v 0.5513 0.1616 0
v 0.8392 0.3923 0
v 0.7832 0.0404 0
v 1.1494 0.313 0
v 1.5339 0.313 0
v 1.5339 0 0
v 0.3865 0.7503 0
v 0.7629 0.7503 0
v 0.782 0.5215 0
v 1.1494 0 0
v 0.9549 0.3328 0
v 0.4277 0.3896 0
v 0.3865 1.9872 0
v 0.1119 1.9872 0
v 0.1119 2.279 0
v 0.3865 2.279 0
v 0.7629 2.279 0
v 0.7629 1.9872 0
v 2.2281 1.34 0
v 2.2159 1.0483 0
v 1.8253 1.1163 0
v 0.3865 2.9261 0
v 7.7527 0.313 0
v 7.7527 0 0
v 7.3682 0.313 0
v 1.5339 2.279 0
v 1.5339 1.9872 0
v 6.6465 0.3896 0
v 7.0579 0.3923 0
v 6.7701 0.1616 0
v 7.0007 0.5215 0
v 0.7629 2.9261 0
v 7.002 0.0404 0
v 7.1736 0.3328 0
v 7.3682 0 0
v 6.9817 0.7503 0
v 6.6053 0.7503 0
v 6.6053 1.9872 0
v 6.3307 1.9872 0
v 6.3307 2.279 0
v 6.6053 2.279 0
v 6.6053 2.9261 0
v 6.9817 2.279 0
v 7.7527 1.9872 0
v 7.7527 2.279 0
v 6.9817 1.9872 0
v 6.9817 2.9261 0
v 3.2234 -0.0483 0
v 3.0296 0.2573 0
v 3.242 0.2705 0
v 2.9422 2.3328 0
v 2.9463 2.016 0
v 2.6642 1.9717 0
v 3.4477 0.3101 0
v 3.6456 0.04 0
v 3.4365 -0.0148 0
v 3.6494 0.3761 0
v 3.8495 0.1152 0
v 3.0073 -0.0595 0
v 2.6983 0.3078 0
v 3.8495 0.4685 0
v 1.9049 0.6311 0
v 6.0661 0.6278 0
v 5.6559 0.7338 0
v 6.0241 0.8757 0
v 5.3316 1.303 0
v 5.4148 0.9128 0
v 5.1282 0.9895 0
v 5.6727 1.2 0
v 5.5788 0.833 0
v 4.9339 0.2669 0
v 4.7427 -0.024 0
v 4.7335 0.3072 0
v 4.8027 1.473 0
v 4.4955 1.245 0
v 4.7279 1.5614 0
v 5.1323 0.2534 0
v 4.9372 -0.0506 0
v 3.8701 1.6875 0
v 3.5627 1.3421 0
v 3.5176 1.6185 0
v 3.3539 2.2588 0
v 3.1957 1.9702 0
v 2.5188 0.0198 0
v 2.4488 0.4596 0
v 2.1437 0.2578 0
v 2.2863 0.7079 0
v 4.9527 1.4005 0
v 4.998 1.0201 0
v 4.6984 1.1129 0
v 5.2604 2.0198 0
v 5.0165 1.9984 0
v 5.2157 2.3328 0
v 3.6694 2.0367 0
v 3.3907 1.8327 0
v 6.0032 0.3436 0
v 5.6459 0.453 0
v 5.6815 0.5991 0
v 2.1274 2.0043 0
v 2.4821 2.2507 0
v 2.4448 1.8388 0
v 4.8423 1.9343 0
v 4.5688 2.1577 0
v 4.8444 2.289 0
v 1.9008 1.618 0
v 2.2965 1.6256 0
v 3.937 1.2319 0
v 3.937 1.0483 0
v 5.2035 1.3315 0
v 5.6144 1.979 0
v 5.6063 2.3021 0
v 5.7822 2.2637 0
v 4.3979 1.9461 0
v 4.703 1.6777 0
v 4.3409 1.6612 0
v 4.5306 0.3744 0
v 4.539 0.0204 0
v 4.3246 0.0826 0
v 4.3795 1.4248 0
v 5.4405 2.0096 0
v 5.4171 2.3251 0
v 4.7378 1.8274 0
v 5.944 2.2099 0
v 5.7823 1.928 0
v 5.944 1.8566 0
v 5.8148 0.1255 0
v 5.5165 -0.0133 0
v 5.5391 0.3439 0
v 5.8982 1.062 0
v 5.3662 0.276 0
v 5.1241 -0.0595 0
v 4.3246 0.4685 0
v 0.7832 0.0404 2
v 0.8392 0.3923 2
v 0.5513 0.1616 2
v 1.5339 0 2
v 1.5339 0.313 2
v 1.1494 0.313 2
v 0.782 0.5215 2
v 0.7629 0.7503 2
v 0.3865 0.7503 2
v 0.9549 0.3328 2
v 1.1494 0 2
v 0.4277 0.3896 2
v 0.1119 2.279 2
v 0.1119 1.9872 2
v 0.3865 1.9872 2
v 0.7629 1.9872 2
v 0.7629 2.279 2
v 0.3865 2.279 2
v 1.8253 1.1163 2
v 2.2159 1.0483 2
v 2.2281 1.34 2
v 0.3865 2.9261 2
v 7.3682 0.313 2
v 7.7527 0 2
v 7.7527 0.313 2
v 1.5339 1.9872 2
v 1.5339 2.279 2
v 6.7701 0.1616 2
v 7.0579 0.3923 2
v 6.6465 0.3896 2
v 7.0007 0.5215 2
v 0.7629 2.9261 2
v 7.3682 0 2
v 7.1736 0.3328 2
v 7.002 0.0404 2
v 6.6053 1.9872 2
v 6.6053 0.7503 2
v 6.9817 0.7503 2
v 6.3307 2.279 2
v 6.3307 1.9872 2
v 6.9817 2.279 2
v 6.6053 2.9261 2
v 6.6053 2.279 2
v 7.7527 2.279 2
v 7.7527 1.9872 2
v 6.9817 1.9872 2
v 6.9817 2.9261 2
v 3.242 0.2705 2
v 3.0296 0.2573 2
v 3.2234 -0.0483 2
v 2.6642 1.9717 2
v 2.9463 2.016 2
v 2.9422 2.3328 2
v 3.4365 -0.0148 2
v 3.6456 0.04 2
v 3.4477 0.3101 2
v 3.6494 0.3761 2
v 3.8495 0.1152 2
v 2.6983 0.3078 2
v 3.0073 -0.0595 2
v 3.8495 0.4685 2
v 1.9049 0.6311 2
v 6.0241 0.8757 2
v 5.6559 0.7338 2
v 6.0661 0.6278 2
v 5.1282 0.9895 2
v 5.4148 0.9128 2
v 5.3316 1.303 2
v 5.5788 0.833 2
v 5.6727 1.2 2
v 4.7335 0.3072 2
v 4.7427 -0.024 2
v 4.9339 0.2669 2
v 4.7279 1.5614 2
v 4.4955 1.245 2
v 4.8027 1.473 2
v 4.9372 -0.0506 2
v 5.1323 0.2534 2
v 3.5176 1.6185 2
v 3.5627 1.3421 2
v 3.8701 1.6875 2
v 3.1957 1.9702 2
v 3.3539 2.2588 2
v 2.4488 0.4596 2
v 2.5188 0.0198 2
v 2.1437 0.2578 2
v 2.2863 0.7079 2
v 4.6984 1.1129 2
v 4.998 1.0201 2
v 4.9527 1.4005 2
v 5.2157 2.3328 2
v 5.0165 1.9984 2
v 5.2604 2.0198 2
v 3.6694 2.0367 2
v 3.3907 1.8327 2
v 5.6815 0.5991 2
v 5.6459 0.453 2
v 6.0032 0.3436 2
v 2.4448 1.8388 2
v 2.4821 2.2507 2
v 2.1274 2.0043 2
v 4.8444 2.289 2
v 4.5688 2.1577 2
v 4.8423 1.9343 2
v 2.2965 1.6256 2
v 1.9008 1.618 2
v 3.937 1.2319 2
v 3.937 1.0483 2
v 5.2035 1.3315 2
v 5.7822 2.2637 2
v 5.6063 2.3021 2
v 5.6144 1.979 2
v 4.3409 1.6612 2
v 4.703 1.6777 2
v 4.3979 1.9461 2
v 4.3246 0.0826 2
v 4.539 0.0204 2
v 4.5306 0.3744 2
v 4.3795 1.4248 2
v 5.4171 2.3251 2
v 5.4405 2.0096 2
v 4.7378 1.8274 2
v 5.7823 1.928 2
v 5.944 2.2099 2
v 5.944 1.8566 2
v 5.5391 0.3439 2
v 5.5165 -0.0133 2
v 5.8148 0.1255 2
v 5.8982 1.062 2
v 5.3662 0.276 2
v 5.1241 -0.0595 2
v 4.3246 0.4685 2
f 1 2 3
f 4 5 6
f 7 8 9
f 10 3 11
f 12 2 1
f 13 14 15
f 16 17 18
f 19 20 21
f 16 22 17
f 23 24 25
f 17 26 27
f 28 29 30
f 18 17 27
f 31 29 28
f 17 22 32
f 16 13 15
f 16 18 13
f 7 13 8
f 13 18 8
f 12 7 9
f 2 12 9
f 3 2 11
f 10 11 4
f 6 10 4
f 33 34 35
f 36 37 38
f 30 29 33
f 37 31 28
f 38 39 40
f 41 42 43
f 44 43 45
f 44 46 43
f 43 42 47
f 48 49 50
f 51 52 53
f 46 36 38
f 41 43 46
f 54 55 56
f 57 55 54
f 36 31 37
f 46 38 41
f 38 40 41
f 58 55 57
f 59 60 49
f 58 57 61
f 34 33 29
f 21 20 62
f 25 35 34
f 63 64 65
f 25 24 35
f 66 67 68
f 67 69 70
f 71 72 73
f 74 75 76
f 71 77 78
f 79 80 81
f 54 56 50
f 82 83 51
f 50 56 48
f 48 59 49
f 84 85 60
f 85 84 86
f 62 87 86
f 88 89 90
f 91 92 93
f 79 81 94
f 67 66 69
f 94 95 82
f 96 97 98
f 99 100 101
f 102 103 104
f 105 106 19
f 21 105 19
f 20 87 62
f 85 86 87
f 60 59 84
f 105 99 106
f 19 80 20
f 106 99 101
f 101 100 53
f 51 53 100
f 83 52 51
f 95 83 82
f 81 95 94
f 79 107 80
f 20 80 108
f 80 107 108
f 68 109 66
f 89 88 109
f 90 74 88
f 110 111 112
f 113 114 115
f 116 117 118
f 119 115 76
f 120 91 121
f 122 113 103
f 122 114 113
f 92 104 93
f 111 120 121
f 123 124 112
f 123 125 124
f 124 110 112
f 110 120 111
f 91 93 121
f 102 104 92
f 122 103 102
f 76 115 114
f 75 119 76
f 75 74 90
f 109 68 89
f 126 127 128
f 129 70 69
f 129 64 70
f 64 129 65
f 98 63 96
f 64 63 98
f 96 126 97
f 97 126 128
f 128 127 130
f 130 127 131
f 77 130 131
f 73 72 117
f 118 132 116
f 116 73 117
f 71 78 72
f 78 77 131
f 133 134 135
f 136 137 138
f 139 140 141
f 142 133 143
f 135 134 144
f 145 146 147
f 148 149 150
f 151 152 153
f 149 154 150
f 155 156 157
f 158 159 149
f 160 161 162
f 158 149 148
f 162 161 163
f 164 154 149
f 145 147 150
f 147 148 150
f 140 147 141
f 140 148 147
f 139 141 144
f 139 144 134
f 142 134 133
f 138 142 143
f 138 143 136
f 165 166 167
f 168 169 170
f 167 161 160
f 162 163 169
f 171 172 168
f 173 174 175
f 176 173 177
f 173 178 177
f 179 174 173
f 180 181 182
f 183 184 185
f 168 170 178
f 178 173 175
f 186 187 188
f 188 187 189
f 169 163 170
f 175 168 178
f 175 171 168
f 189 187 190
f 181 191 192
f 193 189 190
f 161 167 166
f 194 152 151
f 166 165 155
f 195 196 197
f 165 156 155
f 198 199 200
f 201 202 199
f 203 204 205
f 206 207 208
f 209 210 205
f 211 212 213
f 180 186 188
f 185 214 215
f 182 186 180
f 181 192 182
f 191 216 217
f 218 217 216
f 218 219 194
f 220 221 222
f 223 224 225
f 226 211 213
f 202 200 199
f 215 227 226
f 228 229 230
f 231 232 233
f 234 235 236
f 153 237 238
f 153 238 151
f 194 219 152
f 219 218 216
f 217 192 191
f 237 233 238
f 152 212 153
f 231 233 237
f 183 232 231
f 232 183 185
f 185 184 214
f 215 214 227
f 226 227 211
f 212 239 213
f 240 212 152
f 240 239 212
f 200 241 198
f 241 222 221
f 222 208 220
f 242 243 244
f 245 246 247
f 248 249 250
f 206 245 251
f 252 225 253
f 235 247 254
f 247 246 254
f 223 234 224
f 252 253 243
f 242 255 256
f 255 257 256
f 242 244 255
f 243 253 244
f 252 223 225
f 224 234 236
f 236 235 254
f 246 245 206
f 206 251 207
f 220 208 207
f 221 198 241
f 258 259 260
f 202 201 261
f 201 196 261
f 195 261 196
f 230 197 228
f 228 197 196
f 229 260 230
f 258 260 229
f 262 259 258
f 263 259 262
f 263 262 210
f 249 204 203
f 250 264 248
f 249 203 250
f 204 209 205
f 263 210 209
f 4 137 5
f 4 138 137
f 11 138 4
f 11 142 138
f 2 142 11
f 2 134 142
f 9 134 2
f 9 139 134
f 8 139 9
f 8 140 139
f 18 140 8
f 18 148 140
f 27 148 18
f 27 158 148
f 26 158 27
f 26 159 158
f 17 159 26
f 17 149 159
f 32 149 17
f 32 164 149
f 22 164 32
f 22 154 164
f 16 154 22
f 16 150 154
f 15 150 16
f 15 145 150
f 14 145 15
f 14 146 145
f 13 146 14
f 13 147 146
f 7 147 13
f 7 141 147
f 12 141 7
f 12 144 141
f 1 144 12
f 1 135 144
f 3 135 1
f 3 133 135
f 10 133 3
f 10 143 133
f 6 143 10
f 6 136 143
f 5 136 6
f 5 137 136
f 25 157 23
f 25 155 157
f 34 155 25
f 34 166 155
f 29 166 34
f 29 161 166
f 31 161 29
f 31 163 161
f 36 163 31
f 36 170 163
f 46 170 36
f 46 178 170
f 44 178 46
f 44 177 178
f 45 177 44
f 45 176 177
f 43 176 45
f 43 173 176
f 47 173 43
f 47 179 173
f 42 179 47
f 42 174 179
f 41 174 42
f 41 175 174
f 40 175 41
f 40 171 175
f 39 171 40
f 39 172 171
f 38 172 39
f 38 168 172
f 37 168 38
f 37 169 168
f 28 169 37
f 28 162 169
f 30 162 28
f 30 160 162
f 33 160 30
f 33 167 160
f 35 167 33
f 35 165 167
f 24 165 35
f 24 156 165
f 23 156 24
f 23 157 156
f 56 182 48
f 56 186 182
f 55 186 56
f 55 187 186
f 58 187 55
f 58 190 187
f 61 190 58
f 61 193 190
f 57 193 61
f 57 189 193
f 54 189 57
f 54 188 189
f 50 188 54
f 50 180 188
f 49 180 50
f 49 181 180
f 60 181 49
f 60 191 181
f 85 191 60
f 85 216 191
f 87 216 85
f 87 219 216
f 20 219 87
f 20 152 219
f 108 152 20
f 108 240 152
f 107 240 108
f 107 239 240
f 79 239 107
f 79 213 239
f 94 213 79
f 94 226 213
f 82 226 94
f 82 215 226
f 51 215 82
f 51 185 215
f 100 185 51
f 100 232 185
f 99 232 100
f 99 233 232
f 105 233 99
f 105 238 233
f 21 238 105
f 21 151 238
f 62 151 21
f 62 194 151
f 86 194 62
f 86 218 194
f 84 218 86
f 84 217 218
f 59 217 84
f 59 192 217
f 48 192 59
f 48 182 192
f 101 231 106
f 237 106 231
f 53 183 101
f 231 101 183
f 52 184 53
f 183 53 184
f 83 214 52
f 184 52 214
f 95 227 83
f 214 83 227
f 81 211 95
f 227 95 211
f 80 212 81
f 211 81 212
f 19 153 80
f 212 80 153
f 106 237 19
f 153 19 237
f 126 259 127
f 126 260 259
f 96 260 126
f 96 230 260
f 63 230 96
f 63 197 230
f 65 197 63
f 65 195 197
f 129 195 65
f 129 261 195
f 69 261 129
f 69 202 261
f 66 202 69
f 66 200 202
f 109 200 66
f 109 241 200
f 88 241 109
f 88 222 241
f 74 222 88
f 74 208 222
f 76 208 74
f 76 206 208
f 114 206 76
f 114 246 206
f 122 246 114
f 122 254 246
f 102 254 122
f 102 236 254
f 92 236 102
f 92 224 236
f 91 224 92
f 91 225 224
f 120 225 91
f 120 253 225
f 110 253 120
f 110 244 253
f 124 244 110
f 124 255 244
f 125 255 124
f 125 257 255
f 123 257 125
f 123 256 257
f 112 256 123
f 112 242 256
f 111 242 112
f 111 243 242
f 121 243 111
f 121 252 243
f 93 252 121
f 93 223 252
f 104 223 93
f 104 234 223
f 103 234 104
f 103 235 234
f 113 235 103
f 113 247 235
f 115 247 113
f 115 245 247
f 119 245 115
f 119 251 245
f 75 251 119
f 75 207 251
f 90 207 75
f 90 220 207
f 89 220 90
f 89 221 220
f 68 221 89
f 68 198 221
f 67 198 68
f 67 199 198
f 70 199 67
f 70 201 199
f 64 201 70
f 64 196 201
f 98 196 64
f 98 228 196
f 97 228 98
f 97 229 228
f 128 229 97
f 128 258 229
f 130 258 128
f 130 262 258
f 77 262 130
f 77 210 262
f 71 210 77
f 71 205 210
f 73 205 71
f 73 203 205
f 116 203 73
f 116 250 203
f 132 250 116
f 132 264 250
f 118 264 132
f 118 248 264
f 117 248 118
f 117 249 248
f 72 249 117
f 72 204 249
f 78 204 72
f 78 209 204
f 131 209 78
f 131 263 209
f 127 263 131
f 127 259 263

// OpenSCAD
texte_a_inserer = "test"; 
taille = 3; 
police = "LemonOne"; //[[Abril Fatface,Aclonica,Acme,Advent Pro,Akronim,Aladin,Alegreya,Alegreya Sans,Alegreya SC,Alex Brush,Alfa Slab One,Alice,Amaranth,Architects Daughter,Archivo Black,Archivo Narrow,Arimo,Arvo,Asap,Astloch,Asul,Averia Libre,Averia Serif Libre,Bangers,Basic,Belgrano,Berkshire Swash,Bigshot One,Bilbo Swash Caps,Black Ops One,Bonbon,Bowlby One SC,Brawler,Bubblegum Sans,Butterfly Kids,Cabin Condensed,Caesar Dressing,Cagliostro,Calligraffitti,Capriola,Carter One,Changa One,Chango,Chelsea Market,Cherry Cream Soda,Chewy,Chicle,Chivo,Clicker Script,Coming Soon,Concert One,Condiment,Cookie,Courgette,Covered By Your Grace,Crimson Text,Dancing Script,DejaVu Sans,DejaVu Serif,Dhurjati,Doppio One,Dosis,Droid Sans,Eagle Lake,Electrolize,Emilys Candy,Encode Sans,Encode Sans Compressed,Euphoria Script,Exo,Exo 2,Faster One,Federo,Finger Paint,Fjord One,Fontdiner Swanky,Freckle Face,Fruktur,Gabriela,Geo,Germania One,Give You Glory,Gloria Hallelujah,Goudy Bookletter 1911,Graduate,Grand Hotel,Great Vibes,Griffy,Hanalei Fill,Happy Monkey,Henny Penny,Hind,IM Fell English SC,Indie Flower,Irish Grover,Italianno,Jacques Francois Shadow,Jolly Lodger,Josefin Slab,Joti One,Judson,Just Another Hand,Kalam,Kameron,Karma,Kavoon,Knewave,Kranky,Kristi,Laila,Lakki Reddy,Lancelot,Lato,Leckerli One,Ledger,Lekton,Lemon One,Liberation Sans,Libre Caslon Text,Life Savers,Lilita One,Lily Script One,Limelight,Lobster,Lobster Two,Londrina Outline,Londrina Shadow,Londrina Solid,Lora,Love Ya Like A Sister,Loved by the King,Lovers Quarrel,Luckiest Guy,Lusitana,Macondo,Macondo Swash Caps,Mako,Marck Script,Margarine,Marko One,Maven Pro,McLaren,MedievalSharp,Merienda One,Merriweather,Mervale Script,Metal Mania,Metrophobic,Milonga,Miltonian Tattoo,Miss Fajardose,Molle,Montez,Montserrat,Mr De Haviland,Mystery Quest,Neucha,New Rocker,Niconne,Nosifer,Nothing You Could Do,Noto Sans Oriya,Noto Serif,Nova Square,Nunito,Old Standard TT,Oleo Script,Oleo Script Swash Caps,Orbitron,Oregano,Orienta,Original Surfer,Oswald,Over the Rainbow,Overlock,Oxygen,Pacifico,Paprika,Parisienne,Patrick Hand SC,Paytone One,Peralta,Permanent Marker,Piedra,Pirata One,Play,Playball,Poetsen One,Poppins,Press Start 2P,Princess Sofia,PT Mono,Qwigley,Racing Sans One,Raleway,Rancho,Ranga,Ribeye,Roboto,Roboto Condensed,Roboto Slab,Rochester,Rock Salt,Rubik One,Sail,Salsa,Sansita One,Sarina,Satisfy,Schoolbell,Seaweed Script,Sevillana,Shadows Into Light,Shadows Into Light Two,Share,Six Caps,Skranji,Source Sans Pro,Spicy Rice,Stardos Stencil,Stoke,Syncopate,Teko,Terminal Dosis,The Girl Next Door,Tillana,Timmana,Titillium Web,Ubuntu,Ultra,Underdog,UnifrakturCook,UnifrakturMaguntia,Vampiro One,Vidaloka,Viga,Voces,Volkhov,Vollkorn,Voltaire,Waiting for the Sunrise,Wallpoet,Wellfleet,Wendy One,Yellowtail,Yesteryear,Zeyada]]
hauteur = 2; 
module rendu(){
linear_extrude(hauteur) text(texte_a_inserer,size = taille, font = police);
}
rendu();
 
